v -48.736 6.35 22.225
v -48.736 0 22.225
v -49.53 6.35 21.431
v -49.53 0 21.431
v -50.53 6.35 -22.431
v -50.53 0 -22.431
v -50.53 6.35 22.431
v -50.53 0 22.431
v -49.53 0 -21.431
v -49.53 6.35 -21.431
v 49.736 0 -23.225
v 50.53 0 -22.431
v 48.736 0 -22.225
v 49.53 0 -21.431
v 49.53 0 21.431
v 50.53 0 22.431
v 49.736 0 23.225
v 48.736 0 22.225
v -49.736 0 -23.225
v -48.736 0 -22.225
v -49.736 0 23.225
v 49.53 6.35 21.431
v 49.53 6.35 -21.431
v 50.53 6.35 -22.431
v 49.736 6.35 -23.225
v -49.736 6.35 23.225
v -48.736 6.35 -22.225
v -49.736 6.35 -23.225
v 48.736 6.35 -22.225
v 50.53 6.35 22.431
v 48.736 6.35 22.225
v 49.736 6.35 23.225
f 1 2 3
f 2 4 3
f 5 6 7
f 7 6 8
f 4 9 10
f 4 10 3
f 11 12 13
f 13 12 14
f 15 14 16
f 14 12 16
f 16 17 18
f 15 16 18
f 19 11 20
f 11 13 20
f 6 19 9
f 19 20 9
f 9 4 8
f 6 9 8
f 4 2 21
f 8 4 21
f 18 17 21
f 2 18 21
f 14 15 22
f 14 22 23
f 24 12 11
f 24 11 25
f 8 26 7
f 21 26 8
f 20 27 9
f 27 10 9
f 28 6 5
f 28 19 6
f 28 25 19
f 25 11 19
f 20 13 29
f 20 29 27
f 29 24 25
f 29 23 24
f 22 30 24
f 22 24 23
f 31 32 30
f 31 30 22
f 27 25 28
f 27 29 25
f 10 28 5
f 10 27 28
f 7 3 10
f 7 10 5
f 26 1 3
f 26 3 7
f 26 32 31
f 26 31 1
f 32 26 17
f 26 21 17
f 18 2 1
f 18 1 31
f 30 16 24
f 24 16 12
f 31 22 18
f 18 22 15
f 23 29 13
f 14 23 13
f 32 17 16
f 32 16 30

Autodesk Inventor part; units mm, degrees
ref_plane "YZ Plane" through (0, 0, 0) normal (1, 0, 0) x (0, 1, 0)
ref_plane "XZ Plane" through (0, 0, 0) normal (0, 1, 0) x (-1, 0, 0)
ref_plane "XY Plane" through (0, 0, 0) normal (0, 0, 1) x (1, 0, 0)
sketch "Sketch1" plane through (0, 0, 0) normal (0, 1, 0) x (-1, 0, 0)
  line L0 (49.53, 22.225) -> (-49.53, 22.225)
  line L1 (-49.53, 22.225) -> (-49.53, -22.225)
  line L2 (-49.53, -22.225) -> (49.53, -22.225)
  line L3 (49.53, -22.225) -> (49.53, 22.225)
  line L4 (49.53, 22.225) -> (-49.53, -22.225) construction
  line L5 (-49.53, 22.225) -> (49.53, -22.225) construction
  line L6 (50.53, 23.225) -> (-50.53, 23.225)
  line L7 (-50.53, 23.225) -> (-50.53, -23.225)
  line L8 (-50.53, -23.225) -> (50.53, -23.225)
  line L9 (50.53, -23.225) -> (50.53, 23.225)
  point P0 (0, 0)
  dimension "d0" = 44.45
  dimension "d1" = 99.06
  dimension "d2" = 1
extrude "Extrusion1" add sketch "Sketch1" along normal blind 6.35
chamfer "Chamfer1" distance 0.7937 angle 45 8 edges at (-50.53, 3.175, -23.225) (-49.53, 3.175, -22.225) (-49.53, 3.175, 22.225) (-50.53, 3.175, 23.225) (50.53, 3.175, -23.225) (49.53, 3.175, -22.225) (49.53, 3.175, 22.225) (50.53, 3.175, 23.225)
properties part number "band 18t" material "Rubber"
